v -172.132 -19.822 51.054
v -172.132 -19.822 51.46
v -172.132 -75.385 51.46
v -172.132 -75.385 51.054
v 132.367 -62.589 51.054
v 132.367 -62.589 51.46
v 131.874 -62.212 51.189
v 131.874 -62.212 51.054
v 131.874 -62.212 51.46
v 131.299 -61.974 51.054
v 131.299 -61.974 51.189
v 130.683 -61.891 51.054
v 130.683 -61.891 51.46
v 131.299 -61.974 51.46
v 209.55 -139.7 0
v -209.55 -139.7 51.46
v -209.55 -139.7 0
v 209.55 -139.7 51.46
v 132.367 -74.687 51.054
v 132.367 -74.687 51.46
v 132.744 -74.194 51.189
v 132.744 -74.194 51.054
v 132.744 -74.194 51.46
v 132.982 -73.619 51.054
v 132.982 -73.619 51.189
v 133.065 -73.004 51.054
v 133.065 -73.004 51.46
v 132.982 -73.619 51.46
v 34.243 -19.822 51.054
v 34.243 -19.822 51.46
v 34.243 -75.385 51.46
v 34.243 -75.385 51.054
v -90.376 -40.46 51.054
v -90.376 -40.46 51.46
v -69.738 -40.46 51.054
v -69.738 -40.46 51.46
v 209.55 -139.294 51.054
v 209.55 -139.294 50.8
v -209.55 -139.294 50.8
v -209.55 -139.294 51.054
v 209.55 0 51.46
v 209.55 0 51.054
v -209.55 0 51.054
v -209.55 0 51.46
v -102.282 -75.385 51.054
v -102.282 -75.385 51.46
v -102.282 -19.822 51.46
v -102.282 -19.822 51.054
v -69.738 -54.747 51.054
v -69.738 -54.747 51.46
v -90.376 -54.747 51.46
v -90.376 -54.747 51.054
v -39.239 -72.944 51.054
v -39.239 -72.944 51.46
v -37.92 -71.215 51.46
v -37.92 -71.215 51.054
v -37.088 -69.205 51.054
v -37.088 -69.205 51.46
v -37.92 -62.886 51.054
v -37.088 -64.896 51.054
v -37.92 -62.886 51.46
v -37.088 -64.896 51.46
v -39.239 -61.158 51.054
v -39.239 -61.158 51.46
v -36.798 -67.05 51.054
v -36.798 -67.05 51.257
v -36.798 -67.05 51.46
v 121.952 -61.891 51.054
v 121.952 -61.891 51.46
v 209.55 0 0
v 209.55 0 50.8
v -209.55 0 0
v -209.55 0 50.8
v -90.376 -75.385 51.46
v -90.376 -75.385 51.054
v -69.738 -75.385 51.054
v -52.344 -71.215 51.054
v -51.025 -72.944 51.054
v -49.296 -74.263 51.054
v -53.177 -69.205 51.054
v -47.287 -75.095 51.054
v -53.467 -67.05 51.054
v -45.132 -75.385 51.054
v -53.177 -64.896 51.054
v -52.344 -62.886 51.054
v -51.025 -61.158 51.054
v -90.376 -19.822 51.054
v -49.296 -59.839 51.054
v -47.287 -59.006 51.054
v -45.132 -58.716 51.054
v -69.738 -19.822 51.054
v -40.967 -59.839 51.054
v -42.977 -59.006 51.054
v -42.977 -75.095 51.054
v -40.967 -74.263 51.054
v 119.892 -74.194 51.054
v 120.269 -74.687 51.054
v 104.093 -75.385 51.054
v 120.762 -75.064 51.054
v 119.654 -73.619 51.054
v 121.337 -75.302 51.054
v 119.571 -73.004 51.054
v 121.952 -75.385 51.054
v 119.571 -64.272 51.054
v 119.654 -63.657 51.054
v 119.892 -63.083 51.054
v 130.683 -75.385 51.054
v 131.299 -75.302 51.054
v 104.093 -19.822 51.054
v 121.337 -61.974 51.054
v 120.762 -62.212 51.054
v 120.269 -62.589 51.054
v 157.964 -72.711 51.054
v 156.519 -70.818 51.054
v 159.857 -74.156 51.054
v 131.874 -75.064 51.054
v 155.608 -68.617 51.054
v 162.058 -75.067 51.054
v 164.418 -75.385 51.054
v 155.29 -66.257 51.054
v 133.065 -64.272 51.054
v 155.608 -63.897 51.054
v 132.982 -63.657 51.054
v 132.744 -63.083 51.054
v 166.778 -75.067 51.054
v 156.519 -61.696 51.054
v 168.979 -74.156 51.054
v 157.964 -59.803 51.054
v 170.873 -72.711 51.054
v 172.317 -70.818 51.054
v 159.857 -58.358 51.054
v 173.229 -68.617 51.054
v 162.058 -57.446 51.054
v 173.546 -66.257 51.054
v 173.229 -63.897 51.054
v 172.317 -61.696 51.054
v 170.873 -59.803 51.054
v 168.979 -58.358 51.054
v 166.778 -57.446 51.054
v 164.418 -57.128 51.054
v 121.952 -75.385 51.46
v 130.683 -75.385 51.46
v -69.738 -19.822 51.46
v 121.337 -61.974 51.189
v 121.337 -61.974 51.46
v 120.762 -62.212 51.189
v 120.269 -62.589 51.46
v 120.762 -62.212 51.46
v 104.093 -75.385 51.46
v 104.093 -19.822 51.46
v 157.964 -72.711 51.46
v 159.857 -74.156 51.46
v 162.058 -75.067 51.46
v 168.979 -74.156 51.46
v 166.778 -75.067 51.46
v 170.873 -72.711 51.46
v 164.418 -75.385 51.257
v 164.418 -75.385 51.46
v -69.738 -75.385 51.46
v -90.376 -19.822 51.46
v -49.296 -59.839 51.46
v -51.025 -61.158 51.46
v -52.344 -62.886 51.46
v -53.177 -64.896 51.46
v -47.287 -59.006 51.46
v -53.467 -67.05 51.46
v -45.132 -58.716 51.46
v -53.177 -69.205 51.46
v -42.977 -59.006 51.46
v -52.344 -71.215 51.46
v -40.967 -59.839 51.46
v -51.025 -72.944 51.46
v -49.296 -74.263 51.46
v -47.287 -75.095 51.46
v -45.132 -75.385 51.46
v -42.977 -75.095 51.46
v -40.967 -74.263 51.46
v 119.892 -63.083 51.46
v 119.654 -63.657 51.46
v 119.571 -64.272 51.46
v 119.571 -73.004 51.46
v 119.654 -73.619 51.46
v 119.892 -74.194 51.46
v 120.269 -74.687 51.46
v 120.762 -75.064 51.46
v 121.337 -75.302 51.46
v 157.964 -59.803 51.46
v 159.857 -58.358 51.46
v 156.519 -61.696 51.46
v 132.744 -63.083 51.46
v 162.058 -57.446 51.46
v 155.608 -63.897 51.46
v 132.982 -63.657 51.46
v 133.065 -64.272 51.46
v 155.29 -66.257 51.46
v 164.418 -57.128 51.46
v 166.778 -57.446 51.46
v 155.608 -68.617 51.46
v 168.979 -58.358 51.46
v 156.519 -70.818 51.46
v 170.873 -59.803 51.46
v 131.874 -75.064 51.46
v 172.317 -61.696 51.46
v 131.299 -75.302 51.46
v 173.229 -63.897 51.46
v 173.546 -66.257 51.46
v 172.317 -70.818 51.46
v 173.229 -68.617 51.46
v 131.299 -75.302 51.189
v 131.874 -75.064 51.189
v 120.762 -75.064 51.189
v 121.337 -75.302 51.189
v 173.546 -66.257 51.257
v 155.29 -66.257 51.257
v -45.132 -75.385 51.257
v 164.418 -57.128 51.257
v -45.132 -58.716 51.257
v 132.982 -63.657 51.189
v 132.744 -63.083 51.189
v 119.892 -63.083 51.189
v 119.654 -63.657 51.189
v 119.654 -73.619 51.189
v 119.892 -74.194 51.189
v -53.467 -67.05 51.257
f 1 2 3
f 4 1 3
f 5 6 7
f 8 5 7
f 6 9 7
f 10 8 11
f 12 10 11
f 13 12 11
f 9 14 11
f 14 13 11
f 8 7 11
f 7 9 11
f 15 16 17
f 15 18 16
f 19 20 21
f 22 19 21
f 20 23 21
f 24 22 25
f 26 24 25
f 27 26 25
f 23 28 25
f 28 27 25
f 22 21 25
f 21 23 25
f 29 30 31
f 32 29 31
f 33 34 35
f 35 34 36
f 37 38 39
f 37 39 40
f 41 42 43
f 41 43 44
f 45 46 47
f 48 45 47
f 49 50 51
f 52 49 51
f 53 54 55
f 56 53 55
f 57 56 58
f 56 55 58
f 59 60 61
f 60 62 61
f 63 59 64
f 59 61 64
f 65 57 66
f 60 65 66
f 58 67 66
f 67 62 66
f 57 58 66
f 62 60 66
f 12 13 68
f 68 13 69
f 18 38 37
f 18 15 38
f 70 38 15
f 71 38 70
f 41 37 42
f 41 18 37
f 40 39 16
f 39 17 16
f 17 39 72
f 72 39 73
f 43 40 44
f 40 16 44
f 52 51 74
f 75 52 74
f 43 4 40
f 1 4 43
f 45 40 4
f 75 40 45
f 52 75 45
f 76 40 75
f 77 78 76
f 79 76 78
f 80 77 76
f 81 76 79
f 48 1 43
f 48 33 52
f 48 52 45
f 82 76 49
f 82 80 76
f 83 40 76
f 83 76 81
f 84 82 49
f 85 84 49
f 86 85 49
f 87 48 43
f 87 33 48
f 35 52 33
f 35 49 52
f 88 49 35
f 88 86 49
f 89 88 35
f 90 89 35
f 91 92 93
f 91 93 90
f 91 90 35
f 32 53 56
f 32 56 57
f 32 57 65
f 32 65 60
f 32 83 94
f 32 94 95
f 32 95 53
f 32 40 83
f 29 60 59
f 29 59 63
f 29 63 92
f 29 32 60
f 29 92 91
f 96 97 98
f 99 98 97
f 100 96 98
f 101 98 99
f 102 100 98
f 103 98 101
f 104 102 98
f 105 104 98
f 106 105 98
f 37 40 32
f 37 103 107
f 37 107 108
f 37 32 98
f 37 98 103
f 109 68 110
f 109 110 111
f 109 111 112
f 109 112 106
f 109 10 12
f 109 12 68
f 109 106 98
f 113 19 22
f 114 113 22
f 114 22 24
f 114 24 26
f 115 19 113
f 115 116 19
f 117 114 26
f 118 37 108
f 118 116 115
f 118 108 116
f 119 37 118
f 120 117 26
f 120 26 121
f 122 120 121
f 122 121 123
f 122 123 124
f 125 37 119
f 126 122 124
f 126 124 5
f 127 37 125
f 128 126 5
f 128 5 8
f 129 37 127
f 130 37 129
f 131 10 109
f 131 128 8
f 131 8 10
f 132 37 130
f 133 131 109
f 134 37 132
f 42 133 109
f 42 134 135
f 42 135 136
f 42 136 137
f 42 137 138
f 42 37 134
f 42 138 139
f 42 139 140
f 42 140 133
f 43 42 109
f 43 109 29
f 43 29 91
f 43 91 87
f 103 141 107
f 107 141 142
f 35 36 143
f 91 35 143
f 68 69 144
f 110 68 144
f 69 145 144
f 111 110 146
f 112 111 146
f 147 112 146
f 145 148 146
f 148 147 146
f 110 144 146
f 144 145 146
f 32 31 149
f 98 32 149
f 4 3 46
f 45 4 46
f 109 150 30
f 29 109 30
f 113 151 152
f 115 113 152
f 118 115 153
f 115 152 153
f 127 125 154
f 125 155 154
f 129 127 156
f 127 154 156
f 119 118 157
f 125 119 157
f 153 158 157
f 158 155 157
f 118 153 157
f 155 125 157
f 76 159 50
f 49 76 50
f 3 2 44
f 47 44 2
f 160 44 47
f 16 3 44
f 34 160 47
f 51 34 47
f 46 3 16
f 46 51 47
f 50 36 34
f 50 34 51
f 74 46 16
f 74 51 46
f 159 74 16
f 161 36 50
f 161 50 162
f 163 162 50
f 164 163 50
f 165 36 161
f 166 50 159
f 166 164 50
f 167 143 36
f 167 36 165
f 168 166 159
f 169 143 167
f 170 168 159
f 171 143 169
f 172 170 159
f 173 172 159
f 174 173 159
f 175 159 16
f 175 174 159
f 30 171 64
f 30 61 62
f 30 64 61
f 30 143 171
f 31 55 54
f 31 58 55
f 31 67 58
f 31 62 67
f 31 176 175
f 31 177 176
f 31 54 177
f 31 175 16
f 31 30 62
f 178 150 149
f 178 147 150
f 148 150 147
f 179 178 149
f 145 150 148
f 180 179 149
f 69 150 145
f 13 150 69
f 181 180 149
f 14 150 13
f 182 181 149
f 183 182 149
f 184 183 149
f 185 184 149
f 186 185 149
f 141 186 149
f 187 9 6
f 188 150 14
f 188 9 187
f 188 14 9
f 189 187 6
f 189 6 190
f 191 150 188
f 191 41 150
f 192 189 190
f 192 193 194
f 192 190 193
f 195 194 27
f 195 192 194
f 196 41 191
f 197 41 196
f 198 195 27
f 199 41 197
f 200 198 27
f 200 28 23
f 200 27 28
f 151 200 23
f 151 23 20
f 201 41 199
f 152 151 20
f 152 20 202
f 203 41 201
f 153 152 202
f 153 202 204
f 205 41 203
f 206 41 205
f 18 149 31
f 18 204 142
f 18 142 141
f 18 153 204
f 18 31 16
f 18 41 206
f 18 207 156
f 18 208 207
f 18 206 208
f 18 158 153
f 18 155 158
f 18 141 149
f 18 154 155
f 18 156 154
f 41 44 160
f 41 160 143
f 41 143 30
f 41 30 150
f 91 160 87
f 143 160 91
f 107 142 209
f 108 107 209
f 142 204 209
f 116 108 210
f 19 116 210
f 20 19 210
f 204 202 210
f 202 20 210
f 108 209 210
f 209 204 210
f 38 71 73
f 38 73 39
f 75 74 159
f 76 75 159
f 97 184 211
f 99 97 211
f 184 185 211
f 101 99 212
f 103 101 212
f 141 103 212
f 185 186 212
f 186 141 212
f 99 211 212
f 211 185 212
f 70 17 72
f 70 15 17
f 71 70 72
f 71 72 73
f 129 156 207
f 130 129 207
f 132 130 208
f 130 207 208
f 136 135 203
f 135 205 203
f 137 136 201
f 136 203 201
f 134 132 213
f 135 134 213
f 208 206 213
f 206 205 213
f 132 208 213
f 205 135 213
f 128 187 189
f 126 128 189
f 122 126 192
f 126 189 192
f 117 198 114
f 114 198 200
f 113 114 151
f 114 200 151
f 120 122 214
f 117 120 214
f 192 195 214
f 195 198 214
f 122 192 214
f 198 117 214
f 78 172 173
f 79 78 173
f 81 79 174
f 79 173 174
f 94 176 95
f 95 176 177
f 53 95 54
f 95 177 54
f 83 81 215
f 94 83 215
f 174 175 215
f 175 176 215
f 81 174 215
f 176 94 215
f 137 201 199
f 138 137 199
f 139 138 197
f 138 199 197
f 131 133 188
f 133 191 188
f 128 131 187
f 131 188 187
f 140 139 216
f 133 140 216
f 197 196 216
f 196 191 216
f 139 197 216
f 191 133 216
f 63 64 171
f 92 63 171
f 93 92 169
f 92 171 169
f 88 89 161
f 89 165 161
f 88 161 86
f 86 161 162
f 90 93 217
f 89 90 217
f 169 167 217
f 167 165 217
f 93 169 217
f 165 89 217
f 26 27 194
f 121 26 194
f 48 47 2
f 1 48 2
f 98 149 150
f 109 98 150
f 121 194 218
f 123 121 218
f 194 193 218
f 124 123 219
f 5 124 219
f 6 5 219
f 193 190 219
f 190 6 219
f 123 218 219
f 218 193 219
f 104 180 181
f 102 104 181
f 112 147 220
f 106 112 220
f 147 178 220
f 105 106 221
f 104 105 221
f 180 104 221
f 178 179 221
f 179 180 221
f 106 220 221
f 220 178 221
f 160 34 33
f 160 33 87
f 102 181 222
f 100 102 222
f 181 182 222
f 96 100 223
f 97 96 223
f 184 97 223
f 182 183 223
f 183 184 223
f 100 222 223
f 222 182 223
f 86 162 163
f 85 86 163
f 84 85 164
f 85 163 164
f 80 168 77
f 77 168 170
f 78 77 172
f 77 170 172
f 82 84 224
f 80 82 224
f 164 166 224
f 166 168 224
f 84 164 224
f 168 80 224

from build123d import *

# Parameters (mm, degrees)
F1_DEPTH = 209.55
F2_W     = 20.6375
F2_H     = 20.6375
F3_DEPTH = 0.4064


# Not quite as in the source:
# - the dataset's text gives a spline's control points without its knots; the knots are read off the source's solid


with BuildPart() as f1:
    # F0 (on Right) → F1 (new body, symmetric)
    with BuildSketch(Plane.YZ):
        Polygon((-139.7, 0), (0, 0), (0, 50.8), (-139.2936, 50.8), (-139.2936, 51.054), (0, 51.054), (0, 51.4604), (-139.7, 51.4604), align=None)
    extrude(amount=F1_DEPTH, both=True)

    # F2 (on face) → F3 (cut, through all)
    with BuildSketch(Plane.XY.offset(51.4604)):
        with BuildLine():
            add(Edge.make_bspline(
                [(120.2687199611, -62.5889714683), (119.8277505611, -63.0292296683), (119.5707533611, -63.6493706683), (119.5707533611, -64.2722294683)],
                knots=[1, 1, 1, 1, 2, 2, 2, 2], degree=3))
            Line((119.5707533611, -64.2722294683), (119.5707533611, -73.0035048683))
            add(Edge.make_bspline(
                [(119.5707533611, -73.0035048683), (119.5707533611, -73.6270748683), (119.8277505611, -74.2471650683), (120.2687199611, -74.6874486683)],
                knots=[0, 0, 0, 0, 1, 1, 1, 1], degree=3))
            add(Edge.make_bspline(
                [(120.2687199611, -74.6874486683), (120.7090289611, -75.1284180683), (121.3291445611, -75.3847548683), (121.9520033611, -75.3847548683)],
                knots=[1, 1, 1, 1, 2, 2, 2, 2], degree=3))
            Line((121.9520033611, -75.3847548683), (130.6832533611, -75.3847548683))
            add(Edge.make_bspline(
                [(130.6832533611, -75.3847548683), (131.3068233611, -75.3847548683), (131.9269389611, -75.1284180683), (132.3671971611, -74.6874486683)],
                knots=[0, 0, 0, 0, 1, 1, 1, 1], degree=3))
            add(Edge.make_bspline(
                [(132.3671971611, -74.6874486683), (132.8081665611, -74.2471650683), (133.0645033611, -73.6270748683), (133.0645033611, -73.0035048683)],
                knots=[1, 1, 1, 1, 2, 2, 2, 2], degree=3))
            Line((133.0645033611, -73.0035048683), (133.0645033611, -64.2722294683))
            add(Edge.make_bspline(
                [(133.0645033611, -64.2722294683), (133.0645033611, -63.6493706683), (132.8081665611, -63.0292296683), (132.3671971611, -62.5889714683)],
                knots=[0, 0, 0, 0, 1, 1, 1, 1], degree=3))
            add(Edge.make_bspline(
                [(132.3671971611, -62.5889714683), (131.9269389611, -62.1480020683), (131.3068233611, -61.8909794683), (130.6832533611, -61.8909794683)],
                knots=[1, 1, 1, 1, 2, 2, 2, 2], degree=3))
            Line((130.6832533611, -61.8909794683), (121.9520033611, -61.8909794683))
            add(Edge.make_bspline(
                [(121.9520033611, -61.8909794683), (121.3291445611, -61.8909794683), (120.7090289611, -62.1480020683), (120.2687199611, -62.5889714683)],
                knots=[0, 0, 0, 0, 1, 1, 1, 1], degree=3))
        make_face()
        Polygon((-172.1320160389, -19.8222294683), (-172.1320160389, -75.3847548683), (-102.2820160389, -75.3847548683), (-102.2821938389, -19.8222294683), align=None)
        Polygon((-90.3757660389, -75.3847548683), (-69.7382660389, -75.3847548683), (-69.7384438389, -54.7472294683), (-90.3759438389, -54.7472294683), align=None)
        with Locations((-80.0571938389, -30.1409794683)):
            Rectangle(F2_W, F2_H)
        Polygon((34.2429839611, -75.3847548683), (104.0926283611, -75.3847548683), (104.0926283611, -19.8222294683), (34.2426283611, -19.8222294683), align=None)
        with BuildLine():
            add(Edge.make_bspline(
                [(-39.2385048389, -61.1578846683), (-40.7817326389, -59.6144790683), (-42.9500798389, -58.7159794683), (-45.1321938389, -58.7159794683)],
                knots=[7, 7, 7, 7, 8, 8, 8, 8], degree=3))
            add(Edge.make_bspline(
                [(-45.1321938389, -58.7159794683), (-47.3139776389, -58.7159794683), (-49.4823248389, -59.6144790683), (-51.0253748389, -61.1578846683)],
                knots=[0, 0, 0, 0, 1, 1, 1, 1], degree=3))
            add(Edge.make_bspline(
                [(-51.0253748389, -61.1578846683), (-52.5684248389, -62.7005790683), (-53.4665688389, -64.8689262683), (-53.4665688389, -67.0503544683), (-53.4665688389, -69.2324684683), (-52.5682470389, -71.4008156683), (-51.0251970389, -72.9442212683)],
                knots=[1, 1, 1, 1, 2, 2, 2, 3, 3, 3, 3], degree=3))
            add(Edge.make_bspline(
                [(-51.0251970389, -72.9442212683), (-49.4821470389, -74.4869664683), (-47.3137998389, -75.3847548683), (-45.1320160389, -75.3847548683), (-42.9499020389, -75.3847548683), (-40.7815548389, -74.4869664683), (-39.2385048389, -72.9442212683)],
                knots=[3, 3, 3, 3, 4, 4, 4, 5, 5, 5, 5], degree=3))
            add(Edge.make_bspline(
                [(-39.2385048389, -72.9442212683), (-37.6957850389, -71.4008156683), (-36.7979966389, -69.2324684683), (-36.7979966389, -67.0503544683), (-36.7979966389, -64.8689262683), (-37.6957850389, -62.7005790683), (-39.2385048389, -61.1578846683)],
                knots=[5, 5, 5, 5, 6, 6, 6, 7, 7, 7, 7], degree=3))
        make_face()
        with BuildLine():
            add(Edge.make_bspline(
                [(170.8727335611, -59.8025914683), (169.1828715611, -58.1123992683), (166.8078445611, -57.1284794683), (164.4179839611, -57.1284794683)],
                knots=[7, 7, 7, 7, 8, 8, 8, 8], degree=3))
            add(Edge.make_bspline(
                [(164.4179839611, -57.1284794683), (162.0281233611, -57.1284794683), (159.6534011611, -58.1123992683), (157.9635899611, -59.8025914683)],
                knots=[0, 0, 0, 0, 1, 1, 1, 1], degree=3))
            add(Edge.make_bspline(
                [(157.9635899611, -59.8025914683), (156.2737533611, -61.4920470683), (155.2898589611, -63.8670740683), (155.2898589611, -66.2566044683), (155.2898589611, -68.6468206683), (156.2737533611, -71.0218730683), (157.9635899611, -72.7113540683)],
                knots=[1, 1, 1, 1, 2, 2, 2, 3, 3, 3, 3], degree=3))
            add(Edge.make_bspline(
                [(157.9635899611, -72.7113540683), (159.6534011611, -74.4015208683), (162.0281233611, -75.3847548683), (164.4179839611, -75.3847548683), (166.8078445611, -75.3847548683), (169.1828715611, -74.4015208683), (170.8727335611, -72.7113540683)],
                knots=[3, 3, 3, 3, 4, 4, 4, 5, 5, 5, 5], degree=3))
            add(Edge.make_bspline(
                [(170.8727335611, -72.7113540683), (172.5625193611, -71.0218730683), (173.5461089611, -68.6468206683), (173.5461089611, -66.2566044683), (173.5461089611, -63.8670740683), (172.5625193611, -61.4920470683), (170.8727335611, -59.8025914683)],
                knots=[5, 5, 5, 5, 6, 6, 6, 7, 7, 7, 7], degree=3))
        make_face()
    extrude(amount=-F3_DEPTH, mode=Mode.SUBTRACT)


solid = f1.part
